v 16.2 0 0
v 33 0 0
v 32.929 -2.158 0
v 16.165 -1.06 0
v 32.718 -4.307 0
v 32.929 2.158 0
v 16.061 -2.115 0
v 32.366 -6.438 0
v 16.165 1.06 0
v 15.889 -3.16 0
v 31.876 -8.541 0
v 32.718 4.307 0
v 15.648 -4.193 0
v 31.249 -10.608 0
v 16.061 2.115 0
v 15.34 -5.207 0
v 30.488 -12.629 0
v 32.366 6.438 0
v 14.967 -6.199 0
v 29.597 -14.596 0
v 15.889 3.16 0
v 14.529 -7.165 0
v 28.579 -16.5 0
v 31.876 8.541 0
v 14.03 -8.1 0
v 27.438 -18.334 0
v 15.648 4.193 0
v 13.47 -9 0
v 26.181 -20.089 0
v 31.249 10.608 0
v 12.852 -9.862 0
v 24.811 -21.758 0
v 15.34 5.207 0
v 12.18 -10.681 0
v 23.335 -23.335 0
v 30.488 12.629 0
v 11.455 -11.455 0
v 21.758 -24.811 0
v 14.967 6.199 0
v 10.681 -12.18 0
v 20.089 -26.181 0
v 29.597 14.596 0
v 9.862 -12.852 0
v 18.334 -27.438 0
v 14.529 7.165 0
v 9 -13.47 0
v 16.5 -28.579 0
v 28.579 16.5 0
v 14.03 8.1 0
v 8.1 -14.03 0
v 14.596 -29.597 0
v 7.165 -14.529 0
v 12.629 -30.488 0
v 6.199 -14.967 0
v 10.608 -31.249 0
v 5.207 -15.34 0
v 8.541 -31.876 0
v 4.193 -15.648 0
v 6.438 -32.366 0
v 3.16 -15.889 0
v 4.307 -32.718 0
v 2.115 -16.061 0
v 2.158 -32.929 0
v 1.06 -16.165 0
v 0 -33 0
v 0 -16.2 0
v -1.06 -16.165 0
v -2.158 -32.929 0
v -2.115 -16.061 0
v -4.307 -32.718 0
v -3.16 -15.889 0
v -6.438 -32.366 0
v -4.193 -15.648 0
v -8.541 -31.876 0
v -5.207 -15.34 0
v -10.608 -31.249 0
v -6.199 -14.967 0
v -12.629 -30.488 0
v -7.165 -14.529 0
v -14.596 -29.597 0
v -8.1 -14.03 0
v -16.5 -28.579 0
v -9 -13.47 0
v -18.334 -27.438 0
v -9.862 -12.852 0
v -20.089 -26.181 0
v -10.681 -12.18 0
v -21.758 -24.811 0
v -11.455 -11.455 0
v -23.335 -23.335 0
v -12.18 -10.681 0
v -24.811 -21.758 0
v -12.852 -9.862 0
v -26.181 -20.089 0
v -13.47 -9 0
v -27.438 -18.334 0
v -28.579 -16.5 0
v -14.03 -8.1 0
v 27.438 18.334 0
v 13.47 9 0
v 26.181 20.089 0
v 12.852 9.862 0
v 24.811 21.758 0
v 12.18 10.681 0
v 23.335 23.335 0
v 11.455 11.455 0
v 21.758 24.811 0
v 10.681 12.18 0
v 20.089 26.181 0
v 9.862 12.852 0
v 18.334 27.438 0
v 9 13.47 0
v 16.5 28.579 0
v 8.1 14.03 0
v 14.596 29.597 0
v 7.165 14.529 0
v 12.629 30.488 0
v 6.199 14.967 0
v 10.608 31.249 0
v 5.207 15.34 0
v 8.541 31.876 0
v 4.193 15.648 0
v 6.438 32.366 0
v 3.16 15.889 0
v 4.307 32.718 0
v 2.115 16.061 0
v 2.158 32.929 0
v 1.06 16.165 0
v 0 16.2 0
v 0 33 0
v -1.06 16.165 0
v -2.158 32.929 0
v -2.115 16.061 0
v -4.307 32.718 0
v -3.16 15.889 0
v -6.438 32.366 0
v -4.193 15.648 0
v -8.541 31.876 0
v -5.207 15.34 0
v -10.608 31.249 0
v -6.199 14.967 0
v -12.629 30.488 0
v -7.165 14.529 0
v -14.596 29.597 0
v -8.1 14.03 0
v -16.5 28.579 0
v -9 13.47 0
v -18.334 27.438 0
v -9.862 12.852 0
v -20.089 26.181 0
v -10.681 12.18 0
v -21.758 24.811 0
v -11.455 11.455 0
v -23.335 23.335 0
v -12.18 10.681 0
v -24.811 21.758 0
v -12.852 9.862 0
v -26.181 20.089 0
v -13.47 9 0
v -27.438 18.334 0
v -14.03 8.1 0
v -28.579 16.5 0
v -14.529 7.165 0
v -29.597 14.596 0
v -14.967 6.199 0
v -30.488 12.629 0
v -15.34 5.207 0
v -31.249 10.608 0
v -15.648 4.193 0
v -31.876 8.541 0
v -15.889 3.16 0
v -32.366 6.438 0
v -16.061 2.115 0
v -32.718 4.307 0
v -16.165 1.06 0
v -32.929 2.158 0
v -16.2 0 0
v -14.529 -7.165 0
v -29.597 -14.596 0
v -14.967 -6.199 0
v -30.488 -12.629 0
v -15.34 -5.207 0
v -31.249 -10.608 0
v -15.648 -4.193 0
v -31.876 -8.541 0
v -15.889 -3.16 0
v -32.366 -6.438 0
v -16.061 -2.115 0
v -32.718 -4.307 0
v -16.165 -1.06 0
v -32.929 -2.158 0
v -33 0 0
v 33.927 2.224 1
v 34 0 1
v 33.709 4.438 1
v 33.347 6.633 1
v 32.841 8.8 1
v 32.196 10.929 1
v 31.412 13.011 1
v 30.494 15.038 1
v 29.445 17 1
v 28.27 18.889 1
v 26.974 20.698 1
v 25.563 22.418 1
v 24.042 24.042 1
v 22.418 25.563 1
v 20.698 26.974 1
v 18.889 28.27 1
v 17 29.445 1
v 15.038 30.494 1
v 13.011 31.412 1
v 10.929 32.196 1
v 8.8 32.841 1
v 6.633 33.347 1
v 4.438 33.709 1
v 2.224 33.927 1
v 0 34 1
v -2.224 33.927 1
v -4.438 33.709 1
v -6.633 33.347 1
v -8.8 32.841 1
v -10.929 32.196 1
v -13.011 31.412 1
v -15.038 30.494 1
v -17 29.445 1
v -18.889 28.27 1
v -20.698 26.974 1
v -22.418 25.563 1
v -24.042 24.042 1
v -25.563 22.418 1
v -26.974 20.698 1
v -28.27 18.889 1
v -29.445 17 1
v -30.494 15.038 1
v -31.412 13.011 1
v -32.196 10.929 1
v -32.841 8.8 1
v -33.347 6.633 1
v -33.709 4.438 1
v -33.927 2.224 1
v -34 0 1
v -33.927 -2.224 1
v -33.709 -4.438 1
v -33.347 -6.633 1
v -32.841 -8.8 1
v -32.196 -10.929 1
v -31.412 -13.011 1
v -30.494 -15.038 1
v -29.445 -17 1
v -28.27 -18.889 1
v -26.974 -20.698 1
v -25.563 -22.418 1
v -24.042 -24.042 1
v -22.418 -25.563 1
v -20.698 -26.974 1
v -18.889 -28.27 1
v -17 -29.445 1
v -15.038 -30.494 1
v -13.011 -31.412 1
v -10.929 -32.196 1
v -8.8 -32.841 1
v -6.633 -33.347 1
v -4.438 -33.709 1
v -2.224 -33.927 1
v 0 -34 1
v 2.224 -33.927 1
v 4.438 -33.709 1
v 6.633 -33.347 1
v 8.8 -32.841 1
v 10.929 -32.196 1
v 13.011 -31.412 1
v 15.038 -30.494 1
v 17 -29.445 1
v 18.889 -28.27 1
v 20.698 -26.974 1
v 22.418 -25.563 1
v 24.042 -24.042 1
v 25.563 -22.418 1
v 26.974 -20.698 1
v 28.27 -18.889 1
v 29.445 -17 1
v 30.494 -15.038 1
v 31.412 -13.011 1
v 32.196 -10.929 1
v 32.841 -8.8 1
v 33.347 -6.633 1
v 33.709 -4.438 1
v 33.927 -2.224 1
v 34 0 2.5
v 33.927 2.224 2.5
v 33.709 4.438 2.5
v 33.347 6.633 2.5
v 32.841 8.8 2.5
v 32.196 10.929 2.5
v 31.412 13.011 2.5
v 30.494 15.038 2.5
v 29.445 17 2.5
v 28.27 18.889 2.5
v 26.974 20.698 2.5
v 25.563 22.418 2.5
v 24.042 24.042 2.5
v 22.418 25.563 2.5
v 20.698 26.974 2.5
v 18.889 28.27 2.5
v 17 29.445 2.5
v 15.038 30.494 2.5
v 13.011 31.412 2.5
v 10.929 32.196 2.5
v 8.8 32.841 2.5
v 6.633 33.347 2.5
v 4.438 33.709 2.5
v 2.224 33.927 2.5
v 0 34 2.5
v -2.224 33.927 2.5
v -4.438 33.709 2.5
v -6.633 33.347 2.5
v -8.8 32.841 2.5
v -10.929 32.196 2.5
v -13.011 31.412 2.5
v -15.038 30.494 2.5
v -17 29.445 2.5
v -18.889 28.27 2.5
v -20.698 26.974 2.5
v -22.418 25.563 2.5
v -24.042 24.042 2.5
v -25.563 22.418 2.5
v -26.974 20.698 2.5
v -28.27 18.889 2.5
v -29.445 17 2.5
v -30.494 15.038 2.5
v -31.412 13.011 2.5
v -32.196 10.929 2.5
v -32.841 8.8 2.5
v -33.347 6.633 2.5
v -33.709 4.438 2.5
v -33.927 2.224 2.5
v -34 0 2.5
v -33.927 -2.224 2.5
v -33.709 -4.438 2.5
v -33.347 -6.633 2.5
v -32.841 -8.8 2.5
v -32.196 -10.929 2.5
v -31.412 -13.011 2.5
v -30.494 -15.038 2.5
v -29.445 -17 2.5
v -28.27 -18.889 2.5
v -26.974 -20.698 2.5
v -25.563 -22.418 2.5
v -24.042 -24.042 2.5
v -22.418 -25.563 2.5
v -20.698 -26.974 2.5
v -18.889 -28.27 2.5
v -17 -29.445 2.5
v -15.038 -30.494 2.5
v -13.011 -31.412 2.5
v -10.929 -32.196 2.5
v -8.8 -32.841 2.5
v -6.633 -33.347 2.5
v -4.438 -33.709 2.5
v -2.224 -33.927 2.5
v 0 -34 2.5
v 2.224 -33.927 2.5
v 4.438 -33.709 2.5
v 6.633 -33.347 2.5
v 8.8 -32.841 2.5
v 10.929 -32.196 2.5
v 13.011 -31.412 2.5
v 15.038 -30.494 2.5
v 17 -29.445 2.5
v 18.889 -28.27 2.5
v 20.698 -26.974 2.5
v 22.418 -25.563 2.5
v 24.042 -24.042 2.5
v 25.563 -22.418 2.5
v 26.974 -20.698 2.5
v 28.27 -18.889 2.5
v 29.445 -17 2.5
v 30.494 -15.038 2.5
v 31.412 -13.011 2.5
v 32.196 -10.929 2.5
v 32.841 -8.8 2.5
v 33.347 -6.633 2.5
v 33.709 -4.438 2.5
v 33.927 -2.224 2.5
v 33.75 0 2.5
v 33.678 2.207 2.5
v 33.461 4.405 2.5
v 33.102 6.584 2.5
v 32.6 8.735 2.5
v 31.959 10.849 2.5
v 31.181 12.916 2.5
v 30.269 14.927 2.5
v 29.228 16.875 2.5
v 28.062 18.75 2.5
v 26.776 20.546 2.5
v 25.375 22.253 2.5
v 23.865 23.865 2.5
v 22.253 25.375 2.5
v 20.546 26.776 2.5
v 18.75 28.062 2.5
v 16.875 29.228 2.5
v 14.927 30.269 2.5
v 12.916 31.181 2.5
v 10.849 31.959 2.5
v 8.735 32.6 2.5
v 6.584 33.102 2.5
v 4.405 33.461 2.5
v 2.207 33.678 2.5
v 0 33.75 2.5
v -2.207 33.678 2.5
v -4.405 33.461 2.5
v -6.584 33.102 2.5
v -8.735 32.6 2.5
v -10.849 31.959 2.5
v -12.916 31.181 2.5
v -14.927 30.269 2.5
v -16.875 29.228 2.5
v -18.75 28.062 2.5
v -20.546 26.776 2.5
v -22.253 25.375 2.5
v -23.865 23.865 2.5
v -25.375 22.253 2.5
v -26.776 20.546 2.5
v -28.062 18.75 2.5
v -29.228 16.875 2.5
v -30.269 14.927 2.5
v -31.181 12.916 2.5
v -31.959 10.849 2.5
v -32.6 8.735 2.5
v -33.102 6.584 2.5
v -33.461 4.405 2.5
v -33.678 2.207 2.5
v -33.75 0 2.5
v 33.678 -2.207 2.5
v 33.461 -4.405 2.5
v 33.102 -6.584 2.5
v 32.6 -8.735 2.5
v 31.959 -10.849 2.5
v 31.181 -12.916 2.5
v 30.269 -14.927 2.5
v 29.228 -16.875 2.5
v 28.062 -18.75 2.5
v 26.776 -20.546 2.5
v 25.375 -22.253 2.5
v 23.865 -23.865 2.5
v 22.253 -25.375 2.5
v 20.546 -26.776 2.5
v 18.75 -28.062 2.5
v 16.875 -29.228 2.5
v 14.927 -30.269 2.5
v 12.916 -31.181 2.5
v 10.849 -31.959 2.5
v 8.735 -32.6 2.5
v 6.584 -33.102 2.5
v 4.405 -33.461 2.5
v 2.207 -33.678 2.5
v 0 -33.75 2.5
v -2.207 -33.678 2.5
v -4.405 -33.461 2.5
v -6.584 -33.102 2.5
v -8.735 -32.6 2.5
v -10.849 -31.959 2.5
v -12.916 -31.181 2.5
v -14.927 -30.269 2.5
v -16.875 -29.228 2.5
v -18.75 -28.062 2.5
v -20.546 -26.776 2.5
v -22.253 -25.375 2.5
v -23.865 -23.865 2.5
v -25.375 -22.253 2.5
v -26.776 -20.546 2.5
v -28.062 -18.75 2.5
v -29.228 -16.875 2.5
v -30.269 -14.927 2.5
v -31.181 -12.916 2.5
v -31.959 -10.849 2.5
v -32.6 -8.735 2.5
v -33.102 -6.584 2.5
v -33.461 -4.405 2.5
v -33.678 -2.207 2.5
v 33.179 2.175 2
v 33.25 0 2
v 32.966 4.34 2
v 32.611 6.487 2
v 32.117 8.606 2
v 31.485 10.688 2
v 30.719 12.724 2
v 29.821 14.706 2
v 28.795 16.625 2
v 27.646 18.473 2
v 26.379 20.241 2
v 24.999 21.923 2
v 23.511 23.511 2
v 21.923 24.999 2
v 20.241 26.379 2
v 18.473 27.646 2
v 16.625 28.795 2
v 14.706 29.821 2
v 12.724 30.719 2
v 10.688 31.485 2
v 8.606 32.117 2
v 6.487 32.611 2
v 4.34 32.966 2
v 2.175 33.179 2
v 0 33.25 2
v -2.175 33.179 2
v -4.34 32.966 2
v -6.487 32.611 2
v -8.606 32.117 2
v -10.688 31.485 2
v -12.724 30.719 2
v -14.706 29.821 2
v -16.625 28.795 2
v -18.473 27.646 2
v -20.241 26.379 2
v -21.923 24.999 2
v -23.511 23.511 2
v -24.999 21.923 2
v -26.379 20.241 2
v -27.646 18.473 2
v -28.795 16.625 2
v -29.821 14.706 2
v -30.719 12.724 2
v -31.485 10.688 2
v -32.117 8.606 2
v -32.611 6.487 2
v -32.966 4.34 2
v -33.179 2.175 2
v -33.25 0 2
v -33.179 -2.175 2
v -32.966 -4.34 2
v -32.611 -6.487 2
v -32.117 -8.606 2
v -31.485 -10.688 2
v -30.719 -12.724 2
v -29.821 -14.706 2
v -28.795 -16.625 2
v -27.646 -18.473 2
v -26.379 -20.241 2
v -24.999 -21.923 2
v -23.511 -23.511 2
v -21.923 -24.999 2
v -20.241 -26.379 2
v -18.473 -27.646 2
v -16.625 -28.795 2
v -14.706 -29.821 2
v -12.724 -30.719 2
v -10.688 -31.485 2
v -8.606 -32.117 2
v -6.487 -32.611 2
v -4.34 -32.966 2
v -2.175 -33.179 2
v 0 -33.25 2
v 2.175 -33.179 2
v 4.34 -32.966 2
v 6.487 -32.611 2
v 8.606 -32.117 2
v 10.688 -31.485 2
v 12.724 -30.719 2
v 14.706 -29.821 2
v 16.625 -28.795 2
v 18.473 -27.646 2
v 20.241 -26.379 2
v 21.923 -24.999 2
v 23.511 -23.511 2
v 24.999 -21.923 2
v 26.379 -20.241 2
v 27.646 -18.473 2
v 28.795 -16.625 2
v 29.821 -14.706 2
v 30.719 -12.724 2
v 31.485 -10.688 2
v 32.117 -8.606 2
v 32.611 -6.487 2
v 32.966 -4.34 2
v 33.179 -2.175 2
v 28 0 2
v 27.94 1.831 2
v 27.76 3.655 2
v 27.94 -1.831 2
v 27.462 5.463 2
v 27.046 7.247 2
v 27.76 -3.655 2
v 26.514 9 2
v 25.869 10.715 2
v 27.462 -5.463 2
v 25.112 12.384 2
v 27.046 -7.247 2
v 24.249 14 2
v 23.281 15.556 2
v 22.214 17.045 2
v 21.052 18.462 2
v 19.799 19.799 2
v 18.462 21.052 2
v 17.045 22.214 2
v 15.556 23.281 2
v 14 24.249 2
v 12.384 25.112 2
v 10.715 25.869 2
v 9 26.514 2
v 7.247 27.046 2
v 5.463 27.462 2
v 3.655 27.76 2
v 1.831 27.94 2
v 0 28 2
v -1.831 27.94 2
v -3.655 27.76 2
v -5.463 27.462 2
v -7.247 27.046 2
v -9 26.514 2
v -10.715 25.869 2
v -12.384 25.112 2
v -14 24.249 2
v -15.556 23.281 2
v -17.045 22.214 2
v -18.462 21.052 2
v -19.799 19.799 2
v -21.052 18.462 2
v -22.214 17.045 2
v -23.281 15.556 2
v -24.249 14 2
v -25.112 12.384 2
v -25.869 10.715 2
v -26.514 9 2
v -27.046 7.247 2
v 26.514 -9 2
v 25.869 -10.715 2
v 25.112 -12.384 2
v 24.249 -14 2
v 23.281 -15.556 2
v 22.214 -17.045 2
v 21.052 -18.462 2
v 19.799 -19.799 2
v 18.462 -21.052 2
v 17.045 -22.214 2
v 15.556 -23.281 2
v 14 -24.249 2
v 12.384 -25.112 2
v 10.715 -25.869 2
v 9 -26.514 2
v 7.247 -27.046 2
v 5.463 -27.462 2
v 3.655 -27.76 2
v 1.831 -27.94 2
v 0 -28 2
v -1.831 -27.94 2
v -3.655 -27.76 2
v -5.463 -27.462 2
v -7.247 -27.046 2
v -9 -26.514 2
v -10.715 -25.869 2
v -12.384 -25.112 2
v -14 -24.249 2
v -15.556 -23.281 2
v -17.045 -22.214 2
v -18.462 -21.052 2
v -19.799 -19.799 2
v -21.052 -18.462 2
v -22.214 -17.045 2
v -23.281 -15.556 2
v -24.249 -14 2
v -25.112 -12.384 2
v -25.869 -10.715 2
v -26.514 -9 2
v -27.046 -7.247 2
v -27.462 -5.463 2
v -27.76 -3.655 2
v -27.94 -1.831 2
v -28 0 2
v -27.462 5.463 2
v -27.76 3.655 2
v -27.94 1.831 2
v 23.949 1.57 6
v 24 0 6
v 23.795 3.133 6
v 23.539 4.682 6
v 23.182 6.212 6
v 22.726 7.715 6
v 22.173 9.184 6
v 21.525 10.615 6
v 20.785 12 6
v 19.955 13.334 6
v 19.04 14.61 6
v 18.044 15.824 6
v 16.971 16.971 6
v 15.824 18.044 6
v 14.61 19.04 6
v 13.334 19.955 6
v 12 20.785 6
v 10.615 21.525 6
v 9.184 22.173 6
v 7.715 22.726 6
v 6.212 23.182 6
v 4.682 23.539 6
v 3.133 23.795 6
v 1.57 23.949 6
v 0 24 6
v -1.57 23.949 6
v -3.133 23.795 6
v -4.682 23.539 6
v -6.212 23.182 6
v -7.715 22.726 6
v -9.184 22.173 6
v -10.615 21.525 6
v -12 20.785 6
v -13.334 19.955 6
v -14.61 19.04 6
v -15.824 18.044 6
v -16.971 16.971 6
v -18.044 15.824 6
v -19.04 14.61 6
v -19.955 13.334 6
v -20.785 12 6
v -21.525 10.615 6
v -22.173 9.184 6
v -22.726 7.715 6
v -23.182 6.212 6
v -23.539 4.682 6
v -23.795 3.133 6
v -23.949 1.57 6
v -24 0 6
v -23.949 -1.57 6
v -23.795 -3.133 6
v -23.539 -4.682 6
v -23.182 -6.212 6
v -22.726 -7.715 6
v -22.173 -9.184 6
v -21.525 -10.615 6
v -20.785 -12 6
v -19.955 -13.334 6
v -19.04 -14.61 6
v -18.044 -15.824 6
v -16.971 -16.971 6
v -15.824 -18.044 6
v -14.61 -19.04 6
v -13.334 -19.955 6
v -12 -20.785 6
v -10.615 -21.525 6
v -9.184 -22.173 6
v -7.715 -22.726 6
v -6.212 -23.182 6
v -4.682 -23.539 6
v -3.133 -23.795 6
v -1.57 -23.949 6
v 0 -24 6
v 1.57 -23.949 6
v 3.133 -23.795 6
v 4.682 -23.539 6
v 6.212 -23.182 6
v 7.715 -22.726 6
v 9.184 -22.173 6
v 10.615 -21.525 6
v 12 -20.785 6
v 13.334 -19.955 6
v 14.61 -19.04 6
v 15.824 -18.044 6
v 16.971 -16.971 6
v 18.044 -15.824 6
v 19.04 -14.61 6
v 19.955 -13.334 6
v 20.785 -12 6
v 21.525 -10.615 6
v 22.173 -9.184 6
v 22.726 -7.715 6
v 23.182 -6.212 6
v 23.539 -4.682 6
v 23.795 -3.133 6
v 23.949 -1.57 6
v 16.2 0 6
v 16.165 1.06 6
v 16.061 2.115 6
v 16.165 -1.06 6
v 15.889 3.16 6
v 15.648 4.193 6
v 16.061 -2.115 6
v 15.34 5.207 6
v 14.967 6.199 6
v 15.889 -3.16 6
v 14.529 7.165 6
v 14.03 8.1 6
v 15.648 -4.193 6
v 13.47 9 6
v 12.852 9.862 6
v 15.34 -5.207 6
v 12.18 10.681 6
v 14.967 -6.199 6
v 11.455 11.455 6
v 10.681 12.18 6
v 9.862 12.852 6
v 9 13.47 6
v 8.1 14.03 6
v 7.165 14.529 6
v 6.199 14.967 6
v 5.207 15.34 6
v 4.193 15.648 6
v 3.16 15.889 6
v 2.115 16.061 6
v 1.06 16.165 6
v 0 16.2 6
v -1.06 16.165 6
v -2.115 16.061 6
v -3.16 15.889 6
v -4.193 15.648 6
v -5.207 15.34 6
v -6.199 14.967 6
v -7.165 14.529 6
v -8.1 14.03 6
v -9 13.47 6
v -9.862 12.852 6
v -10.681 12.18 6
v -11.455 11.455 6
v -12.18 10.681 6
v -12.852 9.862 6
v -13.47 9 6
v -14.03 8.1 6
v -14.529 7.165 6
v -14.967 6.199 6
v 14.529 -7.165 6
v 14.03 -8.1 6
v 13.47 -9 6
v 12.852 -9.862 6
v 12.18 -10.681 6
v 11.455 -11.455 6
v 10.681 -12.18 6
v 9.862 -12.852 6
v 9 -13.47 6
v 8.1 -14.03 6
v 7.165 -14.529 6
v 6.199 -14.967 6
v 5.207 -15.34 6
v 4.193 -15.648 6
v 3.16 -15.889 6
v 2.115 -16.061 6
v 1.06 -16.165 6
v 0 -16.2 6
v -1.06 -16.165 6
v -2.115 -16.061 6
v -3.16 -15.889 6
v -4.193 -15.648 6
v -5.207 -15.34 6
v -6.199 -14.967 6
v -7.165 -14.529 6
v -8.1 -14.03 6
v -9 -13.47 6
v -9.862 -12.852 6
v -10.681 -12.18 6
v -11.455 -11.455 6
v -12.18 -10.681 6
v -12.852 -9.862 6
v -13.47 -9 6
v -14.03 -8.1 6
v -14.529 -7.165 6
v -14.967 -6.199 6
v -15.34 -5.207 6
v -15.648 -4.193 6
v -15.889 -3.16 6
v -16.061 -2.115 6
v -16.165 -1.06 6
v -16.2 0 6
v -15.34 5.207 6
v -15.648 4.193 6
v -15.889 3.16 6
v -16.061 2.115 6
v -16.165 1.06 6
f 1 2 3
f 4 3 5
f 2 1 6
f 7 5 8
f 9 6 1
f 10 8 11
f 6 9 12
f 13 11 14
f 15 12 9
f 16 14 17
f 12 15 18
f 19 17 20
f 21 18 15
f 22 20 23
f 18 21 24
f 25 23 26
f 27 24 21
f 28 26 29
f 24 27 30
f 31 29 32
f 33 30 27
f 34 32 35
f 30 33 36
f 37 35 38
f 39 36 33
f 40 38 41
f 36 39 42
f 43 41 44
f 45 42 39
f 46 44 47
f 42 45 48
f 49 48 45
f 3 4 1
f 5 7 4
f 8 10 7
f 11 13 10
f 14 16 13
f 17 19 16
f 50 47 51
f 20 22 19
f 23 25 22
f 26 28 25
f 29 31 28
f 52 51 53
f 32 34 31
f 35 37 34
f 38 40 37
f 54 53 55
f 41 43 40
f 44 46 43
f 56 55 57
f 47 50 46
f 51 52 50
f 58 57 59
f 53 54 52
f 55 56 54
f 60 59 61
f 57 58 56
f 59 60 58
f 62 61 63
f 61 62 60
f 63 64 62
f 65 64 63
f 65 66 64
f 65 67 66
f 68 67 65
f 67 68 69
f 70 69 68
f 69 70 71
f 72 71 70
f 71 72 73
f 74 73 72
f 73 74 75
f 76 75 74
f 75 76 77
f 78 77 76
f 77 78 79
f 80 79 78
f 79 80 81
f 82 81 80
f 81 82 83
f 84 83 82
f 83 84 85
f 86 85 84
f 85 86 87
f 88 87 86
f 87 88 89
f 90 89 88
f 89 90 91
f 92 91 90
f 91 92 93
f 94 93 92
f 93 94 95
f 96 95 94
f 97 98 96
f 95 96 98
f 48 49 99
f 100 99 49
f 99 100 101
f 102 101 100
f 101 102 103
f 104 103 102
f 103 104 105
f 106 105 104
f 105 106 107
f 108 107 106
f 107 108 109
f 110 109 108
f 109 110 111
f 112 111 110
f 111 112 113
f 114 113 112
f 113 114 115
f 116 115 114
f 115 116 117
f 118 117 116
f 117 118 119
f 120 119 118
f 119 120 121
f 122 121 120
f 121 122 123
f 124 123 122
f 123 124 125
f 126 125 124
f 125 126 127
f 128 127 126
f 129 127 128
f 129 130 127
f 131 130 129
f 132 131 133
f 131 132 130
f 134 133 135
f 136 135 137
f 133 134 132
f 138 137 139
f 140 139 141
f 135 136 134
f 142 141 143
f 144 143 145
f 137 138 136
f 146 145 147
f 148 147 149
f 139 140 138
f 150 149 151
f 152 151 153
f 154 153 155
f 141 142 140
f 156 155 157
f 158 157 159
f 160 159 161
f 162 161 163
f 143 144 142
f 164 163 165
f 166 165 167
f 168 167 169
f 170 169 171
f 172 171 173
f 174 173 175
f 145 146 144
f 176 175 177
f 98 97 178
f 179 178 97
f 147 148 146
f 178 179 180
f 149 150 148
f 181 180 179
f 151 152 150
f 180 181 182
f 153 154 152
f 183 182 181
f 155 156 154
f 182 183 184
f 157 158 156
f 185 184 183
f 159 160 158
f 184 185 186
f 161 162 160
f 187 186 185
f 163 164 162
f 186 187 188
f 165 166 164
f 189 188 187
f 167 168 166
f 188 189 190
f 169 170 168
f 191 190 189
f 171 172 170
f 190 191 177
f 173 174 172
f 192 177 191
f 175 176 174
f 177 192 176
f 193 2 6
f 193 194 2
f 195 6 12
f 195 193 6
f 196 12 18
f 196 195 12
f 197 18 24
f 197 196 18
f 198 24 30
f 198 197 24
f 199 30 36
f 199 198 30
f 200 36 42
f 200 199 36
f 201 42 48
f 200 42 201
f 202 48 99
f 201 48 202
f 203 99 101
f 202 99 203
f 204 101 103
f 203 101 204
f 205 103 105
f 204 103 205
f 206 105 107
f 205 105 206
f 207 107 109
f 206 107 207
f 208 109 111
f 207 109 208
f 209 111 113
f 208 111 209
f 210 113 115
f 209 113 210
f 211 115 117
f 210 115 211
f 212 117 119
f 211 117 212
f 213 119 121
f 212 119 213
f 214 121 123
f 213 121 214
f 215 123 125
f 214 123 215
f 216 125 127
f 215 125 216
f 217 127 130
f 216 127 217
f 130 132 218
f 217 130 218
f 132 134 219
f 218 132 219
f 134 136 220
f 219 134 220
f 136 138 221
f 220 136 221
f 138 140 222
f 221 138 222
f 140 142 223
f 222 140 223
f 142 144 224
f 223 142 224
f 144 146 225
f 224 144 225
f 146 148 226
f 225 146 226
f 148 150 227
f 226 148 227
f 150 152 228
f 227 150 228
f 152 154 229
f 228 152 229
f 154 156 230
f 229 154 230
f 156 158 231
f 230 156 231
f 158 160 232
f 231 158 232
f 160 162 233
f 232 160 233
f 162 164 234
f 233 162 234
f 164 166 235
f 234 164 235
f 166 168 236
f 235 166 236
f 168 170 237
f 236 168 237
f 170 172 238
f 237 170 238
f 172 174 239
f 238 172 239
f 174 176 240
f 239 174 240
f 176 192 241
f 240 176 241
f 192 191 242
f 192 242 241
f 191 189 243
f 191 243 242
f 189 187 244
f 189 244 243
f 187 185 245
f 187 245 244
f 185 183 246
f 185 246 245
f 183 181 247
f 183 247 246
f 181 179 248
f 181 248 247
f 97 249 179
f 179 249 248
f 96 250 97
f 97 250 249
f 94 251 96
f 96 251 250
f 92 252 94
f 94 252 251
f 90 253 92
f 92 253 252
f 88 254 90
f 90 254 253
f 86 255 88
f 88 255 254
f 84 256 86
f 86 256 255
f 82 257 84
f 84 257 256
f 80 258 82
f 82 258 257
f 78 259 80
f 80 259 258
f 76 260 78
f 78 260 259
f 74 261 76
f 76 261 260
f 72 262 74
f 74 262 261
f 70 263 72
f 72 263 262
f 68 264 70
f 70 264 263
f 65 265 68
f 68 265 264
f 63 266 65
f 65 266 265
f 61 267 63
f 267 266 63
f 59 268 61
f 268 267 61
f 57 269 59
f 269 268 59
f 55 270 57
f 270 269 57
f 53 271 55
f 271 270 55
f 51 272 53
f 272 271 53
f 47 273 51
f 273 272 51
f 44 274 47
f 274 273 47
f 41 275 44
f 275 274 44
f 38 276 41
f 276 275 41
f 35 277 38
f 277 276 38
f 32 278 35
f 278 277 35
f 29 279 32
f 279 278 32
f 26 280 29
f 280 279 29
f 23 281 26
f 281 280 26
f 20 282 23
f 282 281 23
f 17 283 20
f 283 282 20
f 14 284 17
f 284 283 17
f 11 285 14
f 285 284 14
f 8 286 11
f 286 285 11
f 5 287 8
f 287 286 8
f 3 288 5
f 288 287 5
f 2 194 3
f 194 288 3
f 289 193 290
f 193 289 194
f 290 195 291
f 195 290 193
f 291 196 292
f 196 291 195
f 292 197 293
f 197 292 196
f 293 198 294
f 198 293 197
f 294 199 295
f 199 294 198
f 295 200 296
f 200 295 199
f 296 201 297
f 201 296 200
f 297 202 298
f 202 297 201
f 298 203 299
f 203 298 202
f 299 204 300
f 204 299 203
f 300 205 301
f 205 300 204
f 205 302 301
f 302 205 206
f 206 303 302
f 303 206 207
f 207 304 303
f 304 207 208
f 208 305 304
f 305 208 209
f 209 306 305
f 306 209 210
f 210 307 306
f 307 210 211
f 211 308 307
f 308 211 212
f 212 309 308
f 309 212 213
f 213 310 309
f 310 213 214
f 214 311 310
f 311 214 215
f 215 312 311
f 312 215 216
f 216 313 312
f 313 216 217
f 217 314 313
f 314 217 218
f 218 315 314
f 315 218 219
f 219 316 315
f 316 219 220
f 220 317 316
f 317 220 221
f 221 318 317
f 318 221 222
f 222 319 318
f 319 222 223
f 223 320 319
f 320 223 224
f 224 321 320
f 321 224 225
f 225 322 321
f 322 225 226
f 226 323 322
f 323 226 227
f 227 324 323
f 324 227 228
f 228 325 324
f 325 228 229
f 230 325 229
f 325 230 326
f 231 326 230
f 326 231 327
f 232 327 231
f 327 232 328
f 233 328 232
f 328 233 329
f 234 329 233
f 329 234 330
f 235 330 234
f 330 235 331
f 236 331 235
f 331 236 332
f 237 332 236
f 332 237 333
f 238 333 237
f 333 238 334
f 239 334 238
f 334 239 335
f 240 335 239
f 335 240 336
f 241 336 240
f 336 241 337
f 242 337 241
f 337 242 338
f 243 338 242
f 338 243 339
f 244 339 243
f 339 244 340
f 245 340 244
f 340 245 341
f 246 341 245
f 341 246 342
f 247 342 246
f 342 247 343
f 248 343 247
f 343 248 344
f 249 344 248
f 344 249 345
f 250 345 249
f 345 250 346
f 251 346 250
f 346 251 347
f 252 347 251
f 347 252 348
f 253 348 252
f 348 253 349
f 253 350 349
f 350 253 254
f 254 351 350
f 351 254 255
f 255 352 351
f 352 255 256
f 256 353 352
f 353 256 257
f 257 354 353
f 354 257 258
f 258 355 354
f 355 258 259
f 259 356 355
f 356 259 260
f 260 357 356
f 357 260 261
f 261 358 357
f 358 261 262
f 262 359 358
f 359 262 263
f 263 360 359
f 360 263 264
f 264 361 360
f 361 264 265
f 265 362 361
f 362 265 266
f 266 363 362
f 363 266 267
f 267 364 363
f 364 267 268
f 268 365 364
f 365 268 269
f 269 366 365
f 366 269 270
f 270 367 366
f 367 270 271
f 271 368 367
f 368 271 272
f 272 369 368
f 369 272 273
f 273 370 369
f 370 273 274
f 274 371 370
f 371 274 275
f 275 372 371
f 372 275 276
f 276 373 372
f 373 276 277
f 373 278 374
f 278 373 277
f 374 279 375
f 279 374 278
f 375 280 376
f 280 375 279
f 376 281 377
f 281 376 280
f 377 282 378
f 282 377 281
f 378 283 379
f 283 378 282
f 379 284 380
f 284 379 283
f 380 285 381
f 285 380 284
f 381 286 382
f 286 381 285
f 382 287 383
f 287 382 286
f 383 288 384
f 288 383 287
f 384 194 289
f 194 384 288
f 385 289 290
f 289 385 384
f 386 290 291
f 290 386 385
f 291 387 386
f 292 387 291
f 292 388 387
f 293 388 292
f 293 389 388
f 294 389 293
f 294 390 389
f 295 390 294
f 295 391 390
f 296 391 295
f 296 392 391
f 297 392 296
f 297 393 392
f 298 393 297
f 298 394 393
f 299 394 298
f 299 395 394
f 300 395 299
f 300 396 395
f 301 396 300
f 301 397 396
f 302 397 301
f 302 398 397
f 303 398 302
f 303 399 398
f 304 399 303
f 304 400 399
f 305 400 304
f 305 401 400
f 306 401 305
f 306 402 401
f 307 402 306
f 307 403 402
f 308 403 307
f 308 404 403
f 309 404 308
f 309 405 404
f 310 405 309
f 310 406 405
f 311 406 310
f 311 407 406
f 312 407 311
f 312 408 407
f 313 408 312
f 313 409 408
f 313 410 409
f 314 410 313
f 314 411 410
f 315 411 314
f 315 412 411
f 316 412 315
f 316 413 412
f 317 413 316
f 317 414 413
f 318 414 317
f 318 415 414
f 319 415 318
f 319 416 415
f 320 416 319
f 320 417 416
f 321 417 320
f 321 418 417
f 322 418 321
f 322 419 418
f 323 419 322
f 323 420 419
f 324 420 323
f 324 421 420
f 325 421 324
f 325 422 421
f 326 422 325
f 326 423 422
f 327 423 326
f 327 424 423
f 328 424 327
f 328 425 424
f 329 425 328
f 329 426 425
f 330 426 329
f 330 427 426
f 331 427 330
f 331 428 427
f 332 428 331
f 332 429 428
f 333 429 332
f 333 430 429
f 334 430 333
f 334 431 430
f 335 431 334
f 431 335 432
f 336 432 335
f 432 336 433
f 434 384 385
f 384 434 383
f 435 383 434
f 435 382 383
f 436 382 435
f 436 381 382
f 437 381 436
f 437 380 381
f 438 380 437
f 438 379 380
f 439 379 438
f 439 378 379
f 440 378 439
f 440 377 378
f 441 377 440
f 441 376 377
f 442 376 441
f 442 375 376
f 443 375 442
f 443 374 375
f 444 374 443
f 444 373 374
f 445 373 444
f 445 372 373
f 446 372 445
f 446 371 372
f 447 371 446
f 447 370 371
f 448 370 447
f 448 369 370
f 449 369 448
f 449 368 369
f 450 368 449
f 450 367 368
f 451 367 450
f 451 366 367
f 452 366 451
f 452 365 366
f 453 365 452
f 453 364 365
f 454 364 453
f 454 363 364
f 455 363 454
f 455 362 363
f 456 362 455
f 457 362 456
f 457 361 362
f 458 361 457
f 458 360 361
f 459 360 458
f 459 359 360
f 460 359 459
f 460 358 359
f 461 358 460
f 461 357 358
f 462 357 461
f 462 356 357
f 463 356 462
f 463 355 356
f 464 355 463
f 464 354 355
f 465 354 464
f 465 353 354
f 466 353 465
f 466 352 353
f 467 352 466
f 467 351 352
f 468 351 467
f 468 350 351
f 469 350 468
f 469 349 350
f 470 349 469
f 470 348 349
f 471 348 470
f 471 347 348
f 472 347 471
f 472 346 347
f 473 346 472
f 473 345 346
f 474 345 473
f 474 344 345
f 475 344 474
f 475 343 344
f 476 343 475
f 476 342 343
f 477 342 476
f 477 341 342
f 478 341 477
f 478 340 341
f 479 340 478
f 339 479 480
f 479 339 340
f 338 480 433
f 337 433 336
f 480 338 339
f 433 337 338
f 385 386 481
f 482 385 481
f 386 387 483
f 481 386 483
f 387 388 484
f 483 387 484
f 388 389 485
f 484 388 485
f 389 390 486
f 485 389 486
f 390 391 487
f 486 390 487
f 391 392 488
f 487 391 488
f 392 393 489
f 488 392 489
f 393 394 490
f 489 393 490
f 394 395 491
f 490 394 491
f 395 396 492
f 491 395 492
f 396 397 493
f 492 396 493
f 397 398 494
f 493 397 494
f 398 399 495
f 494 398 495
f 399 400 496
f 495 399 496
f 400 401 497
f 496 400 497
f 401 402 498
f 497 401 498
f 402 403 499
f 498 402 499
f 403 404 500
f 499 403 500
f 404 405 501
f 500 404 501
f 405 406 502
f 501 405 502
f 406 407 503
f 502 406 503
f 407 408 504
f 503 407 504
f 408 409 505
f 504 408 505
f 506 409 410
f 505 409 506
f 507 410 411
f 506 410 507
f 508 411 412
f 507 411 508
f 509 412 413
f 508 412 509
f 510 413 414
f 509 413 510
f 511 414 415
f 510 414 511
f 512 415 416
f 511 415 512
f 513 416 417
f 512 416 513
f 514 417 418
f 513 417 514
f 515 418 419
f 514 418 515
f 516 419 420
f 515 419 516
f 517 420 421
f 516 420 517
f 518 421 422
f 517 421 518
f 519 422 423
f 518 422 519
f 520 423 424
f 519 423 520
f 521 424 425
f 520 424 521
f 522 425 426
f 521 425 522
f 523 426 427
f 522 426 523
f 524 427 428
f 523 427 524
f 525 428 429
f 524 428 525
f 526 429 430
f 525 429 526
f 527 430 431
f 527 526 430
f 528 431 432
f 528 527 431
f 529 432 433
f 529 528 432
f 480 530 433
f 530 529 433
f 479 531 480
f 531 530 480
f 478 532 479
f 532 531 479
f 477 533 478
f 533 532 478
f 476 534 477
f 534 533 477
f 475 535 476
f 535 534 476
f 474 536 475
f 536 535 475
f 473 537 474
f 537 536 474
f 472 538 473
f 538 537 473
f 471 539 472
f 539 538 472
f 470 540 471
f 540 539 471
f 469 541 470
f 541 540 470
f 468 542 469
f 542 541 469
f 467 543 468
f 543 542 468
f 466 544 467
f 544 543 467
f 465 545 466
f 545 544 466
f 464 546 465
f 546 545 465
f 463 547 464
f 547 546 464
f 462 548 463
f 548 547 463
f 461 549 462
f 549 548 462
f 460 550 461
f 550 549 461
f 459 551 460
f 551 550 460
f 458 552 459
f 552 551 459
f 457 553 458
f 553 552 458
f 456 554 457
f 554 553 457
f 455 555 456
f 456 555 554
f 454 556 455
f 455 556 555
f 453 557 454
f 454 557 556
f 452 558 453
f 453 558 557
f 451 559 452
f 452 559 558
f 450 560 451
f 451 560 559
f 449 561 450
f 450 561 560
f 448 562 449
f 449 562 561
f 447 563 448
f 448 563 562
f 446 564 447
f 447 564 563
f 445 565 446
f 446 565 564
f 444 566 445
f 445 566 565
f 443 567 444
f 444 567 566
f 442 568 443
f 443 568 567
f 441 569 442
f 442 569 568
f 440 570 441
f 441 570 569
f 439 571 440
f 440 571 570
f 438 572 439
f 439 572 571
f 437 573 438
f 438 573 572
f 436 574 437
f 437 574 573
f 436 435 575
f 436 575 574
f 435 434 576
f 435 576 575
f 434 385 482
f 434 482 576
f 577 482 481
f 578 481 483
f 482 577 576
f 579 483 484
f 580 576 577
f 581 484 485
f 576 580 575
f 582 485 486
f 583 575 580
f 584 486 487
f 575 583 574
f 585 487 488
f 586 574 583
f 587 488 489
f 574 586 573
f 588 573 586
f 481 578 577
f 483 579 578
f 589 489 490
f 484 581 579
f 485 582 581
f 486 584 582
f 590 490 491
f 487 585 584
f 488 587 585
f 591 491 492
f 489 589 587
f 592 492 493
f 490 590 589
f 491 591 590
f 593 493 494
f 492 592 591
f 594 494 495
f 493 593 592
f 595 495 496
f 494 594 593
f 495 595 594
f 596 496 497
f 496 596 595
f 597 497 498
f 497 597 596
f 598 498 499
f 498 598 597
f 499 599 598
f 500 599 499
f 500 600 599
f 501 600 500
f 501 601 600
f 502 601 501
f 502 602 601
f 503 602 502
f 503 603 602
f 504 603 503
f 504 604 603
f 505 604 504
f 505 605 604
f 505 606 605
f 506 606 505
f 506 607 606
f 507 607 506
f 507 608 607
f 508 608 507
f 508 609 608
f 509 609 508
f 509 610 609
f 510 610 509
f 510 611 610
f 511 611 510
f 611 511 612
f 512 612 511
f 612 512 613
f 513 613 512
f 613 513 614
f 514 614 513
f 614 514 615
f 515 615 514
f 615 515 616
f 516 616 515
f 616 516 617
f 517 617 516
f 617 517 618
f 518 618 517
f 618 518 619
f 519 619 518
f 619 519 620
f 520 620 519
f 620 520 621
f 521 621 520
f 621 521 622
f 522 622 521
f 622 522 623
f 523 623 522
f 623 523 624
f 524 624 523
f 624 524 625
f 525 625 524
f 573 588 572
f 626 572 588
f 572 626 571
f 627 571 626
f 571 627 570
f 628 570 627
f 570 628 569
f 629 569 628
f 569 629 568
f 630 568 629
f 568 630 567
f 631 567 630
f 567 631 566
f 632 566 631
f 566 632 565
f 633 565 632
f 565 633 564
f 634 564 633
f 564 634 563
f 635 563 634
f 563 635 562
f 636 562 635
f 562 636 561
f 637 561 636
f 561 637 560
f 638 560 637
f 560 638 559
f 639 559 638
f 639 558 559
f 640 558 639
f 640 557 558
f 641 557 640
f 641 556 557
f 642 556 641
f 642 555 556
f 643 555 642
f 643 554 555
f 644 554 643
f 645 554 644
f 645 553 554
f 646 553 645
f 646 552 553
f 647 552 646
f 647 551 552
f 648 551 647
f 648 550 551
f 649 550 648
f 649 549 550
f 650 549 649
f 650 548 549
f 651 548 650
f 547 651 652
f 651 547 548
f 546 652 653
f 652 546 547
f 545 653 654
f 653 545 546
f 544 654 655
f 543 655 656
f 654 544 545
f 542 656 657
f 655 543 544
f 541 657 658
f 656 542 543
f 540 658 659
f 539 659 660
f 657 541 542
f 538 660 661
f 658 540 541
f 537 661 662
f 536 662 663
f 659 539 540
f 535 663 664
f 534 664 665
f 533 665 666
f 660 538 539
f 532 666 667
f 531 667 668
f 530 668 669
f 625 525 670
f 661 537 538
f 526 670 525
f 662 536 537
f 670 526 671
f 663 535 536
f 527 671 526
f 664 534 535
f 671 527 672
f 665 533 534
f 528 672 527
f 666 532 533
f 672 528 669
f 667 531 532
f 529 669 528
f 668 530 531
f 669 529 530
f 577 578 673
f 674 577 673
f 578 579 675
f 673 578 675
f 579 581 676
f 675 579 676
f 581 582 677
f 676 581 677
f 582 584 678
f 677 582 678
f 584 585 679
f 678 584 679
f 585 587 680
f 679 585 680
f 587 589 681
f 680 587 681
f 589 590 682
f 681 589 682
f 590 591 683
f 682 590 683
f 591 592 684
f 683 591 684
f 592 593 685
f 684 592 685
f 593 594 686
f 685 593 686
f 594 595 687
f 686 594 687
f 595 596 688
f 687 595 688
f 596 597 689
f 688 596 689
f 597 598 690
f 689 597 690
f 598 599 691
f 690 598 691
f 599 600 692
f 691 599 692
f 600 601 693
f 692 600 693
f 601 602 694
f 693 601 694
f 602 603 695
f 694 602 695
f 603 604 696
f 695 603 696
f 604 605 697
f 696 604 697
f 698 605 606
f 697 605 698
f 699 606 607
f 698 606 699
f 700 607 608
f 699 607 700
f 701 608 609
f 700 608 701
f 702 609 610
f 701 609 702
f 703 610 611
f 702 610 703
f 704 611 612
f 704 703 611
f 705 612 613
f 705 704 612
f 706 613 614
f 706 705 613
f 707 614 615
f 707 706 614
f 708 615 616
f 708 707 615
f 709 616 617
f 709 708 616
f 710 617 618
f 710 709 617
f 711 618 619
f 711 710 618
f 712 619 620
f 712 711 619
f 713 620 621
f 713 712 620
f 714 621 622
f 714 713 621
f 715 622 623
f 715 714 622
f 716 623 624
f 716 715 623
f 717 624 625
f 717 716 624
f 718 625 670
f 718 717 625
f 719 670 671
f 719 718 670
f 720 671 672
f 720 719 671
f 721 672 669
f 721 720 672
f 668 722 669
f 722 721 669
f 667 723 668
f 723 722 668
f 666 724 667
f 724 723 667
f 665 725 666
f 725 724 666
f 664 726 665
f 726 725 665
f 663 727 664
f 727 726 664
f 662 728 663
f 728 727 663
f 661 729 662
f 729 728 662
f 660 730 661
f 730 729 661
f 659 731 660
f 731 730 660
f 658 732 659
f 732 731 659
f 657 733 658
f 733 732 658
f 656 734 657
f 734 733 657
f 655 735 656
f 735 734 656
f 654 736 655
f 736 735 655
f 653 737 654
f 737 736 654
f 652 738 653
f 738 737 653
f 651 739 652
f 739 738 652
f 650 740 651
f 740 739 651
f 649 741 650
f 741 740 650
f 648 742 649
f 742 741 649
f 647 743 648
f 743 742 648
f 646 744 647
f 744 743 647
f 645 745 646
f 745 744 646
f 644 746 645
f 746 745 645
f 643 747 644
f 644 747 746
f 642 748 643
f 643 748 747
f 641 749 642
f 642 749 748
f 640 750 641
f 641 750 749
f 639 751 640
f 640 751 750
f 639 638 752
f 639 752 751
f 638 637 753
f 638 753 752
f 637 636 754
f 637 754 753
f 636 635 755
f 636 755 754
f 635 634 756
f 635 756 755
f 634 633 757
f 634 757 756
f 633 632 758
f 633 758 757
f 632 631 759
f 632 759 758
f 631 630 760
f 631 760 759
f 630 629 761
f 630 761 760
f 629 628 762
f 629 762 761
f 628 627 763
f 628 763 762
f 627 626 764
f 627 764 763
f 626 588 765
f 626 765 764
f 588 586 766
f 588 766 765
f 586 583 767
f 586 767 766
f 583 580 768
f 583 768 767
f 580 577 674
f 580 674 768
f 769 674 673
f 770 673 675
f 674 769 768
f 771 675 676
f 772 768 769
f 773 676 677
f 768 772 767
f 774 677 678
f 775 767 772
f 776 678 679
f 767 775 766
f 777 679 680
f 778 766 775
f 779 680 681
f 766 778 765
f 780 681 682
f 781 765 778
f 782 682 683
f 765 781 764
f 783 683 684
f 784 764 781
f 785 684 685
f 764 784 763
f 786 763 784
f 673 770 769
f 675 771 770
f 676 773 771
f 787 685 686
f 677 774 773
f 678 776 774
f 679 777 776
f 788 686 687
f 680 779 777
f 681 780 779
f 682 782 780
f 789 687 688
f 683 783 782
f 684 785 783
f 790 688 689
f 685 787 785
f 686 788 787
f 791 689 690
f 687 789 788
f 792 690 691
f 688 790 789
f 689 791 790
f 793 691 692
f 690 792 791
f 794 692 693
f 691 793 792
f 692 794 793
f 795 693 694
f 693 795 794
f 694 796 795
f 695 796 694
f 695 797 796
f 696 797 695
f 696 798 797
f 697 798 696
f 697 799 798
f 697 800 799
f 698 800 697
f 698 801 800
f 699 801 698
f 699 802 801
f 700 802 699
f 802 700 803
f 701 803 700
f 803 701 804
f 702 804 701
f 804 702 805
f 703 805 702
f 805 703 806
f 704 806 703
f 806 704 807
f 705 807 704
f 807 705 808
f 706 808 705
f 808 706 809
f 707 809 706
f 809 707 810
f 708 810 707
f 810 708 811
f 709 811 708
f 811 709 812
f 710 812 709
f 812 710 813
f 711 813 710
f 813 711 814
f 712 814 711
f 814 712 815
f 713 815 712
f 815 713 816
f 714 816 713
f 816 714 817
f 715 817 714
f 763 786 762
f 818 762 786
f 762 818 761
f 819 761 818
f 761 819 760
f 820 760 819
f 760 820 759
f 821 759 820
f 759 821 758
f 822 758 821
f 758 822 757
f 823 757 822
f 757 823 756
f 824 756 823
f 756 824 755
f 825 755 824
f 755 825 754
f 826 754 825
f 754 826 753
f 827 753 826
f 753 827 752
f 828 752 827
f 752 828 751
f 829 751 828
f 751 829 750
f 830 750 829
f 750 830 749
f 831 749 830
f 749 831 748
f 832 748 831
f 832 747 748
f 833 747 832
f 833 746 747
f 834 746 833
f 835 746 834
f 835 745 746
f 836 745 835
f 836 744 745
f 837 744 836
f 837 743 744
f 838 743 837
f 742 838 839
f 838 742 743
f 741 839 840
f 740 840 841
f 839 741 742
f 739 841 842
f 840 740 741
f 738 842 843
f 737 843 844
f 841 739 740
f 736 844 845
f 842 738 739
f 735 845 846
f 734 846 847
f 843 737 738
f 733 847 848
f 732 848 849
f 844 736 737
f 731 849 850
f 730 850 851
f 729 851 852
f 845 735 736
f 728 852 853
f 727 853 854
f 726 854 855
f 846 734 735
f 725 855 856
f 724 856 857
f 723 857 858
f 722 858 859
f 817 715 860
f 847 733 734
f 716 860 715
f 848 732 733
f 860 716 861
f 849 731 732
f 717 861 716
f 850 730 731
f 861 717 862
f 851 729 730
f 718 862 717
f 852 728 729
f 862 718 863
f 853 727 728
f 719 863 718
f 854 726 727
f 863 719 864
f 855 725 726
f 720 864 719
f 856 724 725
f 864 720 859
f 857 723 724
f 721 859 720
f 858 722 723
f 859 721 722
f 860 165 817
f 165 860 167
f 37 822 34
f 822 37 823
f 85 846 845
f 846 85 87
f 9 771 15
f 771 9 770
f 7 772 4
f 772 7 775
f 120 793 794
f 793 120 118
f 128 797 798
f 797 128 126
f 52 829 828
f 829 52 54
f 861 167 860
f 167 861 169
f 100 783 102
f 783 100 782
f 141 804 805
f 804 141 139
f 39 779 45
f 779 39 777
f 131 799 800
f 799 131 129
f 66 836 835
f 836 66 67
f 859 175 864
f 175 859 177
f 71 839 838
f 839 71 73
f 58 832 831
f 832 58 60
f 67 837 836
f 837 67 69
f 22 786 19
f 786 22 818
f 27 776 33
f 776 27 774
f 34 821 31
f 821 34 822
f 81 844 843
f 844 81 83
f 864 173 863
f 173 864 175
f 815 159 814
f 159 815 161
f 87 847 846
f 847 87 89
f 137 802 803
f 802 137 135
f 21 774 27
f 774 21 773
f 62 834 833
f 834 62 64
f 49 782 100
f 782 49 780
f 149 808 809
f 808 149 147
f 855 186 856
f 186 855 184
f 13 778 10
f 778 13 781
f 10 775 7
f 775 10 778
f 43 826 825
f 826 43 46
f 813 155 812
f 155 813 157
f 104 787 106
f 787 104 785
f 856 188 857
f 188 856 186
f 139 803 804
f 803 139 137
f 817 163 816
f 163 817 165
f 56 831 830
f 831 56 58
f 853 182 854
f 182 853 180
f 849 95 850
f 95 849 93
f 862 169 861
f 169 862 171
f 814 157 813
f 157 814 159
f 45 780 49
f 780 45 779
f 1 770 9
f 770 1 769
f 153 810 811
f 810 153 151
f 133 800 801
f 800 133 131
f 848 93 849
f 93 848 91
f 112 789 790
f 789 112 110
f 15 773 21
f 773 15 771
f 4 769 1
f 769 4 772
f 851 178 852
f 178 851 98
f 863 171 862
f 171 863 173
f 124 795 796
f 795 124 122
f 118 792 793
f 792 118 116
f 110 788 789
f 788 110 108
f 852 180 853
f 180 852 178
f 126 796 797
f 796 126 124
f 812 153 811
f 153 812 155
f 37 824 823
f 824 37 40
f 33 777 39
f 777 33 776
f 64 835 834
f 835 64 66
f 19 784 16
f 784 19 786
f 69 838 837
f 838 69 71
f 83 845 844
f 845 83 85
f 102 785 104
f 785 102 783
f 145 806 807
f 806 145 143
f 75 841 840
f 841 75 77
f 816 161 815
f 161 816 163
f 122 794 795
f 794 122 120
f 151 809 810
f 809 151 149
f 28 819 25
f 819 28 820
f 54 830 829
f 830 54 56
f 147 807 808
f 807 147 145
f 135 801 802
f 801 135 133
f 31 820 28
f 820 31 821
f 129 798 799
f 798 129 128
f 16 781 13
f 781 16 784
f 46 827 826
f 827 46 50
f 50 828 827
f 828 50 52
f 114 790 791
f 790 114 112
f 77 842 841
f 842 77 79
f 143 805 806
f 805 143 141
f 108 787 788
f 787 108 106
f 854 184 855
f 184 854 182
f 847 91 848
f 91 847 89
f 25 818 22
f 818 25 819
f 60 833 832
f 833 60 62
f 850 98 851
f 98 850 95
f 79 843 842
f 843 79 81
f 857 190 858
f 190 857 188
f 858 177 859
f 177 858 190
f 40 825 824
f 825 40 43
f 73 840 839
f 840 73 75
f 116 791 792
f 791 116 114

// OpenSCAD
// MasonJarLid0.1
// 
// Just a simple, thin (or thick, if you want) lid.  No built-in ring.

outer_diameter = "68mm";
outer_thickness = "2mm";
outer_rim_height = "0.5mm";
outer_rim_thickness = "0.5mm";
inner_plateau_diameter = "56mm";
inner_plateau_height   = "4mm";

center_hole_spec = "straight-32mm";
center_hole_r_offset = "0.2mm";

$fn = 96;

module __masonjarlid0__end_params() { }

use <../lib/TOGMod1.scad>
use <../lib/TOGPolyhedronLib1.scad>
use <../lib/TOGThreads2.scad>
use <../lib/TOGUnits1.scad>

outer_diameter_mm = togunits1_to_mm(outer_diameter);
outer_thickness_mm = togunits1_to_mm(outer_thickness);
outer_rim_height_mm = togunits1_to_mm(outer_rim_height);
outer_rim_thickness_mm = togunits1_to_mm(outer_rim_thickness);
inner_plateau_diameter_mm = togunits1_to_mm(inner_plateau_diameter);
inner_plateau_height_mm = togunits1_to_mm(inner_plateau_height);
center_hole_r_offset_mm = togunits1_to_mm(center_hole_r_offset);

togmod1_domodule(["difference",
	let(bbev = max(0.1, min(outer_thickness_mm+outer_rim_height_mm-1, 1))) // Bottom bevel
	tphl1_make_z_cylinder(zds=[
		[0, outer_diameter_mm-bbev*2],
		[bbev, outer_diameter_mm],
		[outer_thickness_mm + outer_rim_height_mm, outer_diameter_mm],
		[outer_thickness_mm + outer_rim_height_mm, outer_diameter_mm - outer_rim_thickness_mm],
		[outer_thickness_mm                      , outer_diameter_mm - outer_rim_thickness_mm*3],
		[outer_thickness_mm                      , inner_plateau_diameter_mm               ],
		[outer_thickness_mm + inner_plateau_height_mm, inner_plateau_diameter_mm - inner_plateau_height_mm*2],
   ]),
	
	togthreads2_make_threads(
		togthreads2_simple_zparams([[-1, 1], [outer_thickness_mm + inner_plateau_height_mm+1, 1]], taper_length=1, extend=1),
		center_hole_spec, r_offset=center_hole_r_offset_mm
	),
]);
